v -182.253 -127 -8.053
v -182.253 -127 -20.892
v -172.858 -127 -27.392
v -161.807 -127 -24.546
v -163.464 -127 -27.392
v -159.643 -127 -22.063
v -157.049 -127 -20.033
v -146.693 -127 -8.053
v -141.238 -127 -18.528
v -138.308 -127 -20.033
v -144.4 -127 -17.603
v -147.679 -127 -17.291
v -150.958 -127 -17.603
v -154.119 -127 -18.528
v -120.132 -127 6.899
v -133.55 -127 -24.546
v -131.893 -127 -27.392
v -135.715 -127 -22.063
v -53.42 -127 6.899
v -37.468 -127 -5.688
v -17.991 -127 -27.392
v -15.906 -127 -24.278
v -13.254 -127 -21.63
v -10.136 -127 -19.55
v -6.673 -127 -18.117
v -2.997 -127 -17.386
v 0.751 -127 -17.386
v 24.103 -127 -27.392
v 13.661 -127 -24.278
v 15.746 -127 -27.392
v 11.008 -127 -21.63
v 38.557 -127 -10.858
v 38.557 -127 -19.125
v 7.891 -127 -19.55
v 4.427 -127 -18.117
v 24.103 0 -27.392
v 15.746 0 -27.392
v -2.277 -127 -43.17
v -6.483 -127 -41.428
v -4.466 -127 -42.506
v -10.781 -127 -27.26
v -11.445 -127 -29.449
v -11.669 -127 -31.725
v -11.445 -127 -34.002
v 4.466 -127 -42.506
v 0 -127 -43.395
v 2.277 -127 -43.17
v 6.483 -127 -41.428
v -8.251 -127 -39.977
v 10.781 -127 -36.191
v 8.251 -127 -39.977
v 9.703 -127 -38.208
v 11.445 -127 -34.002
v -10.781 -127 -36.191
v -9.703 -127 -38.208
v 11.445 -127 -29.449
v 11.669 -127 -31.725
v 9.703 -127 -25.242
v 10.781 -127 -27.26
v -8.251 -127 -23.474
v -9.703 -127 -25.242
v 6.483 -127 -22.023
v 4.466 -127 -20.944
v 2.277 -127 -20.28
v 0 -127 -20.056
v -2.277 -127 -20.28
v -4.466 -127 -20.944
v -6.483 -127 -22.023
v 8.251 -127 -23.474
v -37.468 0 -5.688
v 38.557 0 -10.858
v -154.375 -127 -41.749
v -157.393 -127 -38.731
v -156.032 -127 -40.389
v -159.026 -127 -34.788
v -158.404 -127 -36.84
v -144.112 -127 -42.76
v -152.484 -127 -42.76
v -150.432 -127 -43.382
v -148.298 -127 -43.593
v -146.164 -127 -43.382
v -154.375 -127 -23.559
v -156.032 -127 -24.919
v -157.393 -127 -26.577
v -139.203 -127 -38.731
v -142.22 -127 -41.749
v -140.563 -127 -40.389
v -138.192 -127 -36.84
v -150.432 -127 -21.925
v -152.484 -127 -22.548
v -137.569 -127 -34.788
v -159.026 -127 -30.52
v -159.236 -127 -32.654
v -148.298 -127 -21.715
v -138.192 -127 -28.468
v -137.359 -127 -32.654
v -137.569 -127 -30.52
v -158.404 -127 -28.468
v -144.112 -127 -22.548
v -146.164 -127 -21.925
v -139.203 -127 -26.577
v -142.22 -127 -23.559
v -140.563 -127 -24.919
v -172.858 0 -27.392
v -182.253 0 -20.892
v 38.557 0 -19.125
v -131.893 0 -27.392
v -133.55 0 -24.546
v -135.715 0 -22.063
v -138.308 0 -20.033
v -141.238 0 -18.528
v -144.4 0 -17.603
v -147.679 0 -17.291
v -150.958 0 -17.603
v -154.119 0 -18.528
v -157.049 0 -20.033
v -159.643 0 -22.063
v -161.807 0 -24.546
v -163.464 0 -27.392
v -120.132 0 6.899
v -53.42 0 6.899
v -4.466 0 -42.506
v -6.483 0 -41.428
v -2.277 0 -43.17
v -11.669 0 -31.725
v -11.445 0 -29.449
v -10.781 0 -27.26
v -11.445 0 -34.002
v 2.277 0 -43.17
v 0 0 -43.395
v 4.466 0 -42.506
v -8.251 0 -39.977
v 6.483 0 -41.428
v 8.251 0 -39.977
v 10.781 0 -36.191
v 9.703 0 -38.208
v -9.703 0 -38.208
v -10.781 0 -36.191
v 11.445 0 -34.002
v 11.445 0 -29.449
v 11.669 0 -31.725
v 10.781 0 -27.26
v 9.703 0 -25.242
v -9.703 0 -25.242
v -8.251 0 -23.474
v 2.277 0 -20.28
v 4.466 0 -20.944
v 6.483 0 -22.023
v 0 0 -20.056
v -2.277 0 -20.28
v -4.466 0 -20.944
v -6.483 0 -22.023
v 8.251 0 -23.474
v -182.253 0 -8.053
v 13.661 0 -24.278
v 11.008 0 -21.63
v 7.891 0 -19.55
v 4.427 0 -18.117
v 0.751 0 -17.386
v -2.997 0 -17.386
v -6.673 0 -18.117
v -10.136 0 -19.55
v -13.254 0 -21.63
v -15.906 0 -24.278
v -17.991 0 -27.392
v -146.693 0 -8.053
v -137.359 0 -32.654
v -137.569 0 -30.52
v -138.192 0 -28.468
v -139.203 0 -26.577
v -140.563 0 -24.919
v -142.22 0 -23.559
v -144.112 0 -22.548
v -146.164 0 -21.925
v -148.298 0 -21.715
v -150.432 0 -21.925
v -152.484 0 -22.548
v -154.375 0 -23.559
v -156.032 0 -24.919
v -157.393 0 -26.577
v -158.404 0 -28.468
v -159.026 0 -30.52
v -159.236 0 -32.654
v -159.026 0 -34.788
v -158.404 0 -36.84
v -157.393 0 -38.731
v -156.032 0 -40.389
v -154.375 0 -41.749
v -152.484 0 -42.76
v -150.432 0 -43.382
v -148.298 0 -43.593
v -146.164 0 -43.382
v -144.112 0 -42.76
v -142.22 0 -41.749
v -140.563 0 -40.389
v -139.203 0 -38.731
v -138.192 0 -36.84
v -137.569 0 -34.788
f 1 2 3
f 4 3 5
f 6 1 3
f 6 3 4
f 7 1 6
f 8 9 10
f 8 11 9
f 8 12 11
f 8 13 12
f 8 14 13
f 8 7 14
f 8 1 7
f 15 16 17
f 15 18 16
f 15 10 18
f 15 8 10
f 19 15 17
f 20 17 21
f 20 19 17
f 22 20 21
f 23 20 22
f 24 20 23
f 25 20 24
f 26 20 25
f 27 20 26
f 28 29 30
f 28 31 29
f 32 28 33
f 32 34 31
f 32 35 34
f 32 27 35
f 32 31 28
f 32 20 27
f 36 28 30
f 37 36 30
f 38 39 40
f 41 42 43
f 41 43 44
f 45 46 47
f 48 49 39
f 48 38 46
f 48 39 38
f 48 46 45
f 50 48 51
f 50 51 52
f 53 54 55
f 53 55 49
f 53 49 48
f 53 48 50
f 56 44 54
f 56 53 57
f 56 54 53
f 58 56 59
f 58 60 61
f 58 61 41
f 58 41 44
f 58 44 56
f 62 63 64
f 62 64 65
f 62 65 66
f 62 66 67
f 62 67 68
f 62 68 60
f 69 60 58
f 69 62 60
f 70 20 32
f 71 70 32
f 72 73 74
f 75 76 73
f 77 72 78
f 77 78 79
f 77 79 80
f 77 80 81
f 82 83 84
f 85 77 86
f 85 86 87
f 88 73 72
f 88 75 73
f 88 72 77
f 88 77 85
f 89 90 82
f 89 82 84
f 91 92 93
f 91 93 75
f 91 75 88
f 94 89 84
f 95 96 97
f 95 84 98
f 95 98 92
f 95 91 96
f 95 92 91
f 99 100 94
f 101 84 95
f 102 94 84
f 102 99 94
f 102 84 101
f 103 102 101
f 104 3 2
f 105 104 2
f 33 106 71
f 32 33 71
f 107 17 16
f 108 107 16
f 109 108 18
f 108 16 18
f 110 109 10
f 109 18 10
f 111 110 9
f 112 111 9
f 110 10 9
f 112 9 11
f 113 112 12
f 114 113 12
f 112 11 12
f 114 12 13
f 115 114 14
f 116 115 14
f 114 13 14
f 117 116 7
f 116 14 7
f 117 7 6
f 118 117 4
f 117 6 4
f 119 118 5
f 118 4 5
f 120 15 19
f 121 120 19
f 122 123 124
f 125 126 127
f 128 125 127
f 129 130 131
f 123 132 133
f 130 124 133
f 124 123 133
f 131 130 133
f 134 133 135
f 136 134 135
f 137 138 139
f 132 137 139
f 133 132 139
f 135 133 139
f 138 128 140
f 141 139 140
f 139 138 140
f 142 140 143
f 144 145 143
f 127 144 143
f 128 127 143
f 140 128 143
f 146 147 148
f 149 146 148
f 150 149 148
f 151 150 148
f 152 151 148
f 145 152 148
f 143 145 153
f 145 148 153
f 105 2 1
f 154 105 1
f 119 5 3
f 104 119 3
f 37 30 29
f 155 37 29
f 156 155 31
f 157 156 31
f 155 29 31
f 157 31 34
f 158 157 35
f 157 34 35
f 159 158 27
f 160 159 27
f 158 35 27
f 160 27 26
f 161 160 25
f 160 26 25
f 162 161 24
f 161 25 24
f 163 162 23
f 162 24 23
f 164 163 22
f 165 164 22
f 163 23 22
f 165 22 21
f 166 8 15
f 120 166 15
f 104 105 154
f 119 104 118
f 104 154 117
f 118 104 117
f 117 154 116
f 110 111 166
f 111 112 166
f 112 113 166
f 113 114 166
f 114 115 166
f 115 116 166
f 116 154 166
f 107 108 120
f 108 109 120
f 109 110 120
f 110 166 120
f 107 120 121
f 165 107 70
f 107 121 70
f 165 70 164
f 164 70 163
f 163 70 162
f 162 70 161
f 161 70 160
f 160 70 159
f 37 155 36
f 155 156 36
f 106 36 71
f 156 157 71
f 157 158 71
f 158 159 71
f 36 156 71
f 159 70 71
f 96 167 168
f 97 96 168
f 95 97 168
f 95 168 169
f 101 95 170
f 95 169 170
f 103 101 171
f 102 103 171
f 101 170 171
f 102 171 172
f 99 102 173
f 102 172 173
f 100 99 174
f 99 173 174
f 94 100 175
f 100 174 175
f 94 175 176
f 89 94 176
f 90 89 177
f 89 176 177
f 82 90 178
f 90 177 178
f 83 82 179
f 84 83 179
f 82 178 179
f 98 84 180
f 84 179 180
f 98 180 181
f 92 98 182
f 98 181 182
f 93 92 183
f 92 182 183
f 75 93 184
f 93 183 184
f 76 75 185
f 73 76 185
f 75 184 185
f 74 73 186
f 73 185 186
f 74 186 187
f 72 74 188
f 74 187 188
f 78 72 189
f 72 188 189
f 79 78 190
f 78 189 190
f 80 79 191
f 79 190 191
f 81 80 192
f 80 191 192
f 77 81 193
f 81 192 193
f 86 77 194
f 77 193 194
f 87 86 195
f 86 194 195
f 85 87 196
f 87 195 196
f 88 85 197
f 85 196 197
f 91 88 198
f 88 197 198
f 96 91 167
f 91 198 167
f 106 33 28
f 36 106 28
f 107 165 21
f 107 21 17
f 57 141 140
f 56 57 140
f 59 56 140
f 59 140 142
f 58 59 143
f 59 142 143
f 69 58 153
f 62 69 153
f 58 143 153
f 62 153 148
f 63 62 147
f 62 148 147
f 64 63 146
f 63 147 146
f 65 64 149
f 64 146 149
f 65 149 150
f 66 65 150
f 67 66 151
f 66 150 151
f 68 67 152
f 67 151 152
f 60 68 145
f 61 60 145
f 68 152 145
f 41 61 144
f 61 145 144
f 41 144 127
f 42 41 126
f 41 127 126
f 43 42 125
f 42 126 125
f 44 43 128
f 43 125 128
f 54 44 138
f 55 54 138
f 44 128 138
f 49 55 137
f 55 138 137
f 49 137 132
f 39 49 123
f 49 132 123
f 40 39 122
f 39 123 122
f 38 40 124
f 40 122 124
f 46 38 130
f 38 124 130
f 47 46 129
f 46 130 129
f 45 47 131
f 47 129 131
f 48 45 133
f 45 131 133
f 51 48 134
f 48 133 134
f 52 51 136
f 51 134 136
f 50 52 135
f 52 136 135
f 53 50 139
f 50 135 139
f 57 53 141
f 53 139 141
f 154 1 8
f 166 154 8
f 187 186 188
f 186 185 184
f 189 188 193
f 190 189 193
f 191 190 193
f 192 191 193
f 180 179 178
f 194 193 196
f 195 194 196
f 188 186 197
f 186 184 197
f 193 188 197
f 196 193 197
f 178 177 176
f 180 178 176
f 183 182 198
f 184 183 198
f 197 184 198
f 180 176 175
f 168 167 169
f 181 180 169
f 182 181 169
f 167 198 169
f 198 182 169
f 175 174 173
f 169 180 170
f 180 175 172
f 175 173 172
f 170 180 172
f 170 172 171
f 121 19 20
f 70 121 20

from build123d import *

# Parameters (mm, degrees)
F0_W     = 254
F0_H     = 63.5
F1_DEPTH = 127
F3_DEPTH = 127
F5_DEPTH = 127
F7_DEPTH = 127
F8_R     = 10.938676
F8_R_2   = 11.669206
F9_DEPTH = 127


with BuildPart() as f1:
    # F0 (on Front) → F1 (new body)
    with BuildSketch(Plane.XZ):
        with Locations((-88.44309, -10.857639)):
            Rectangle(F0_W, F0_H)
    extrude(amount=F1_DEPTH)

    # F2 (on face) → F3 (cut)
    with BuildSketch(Plane.XZ.offset(127)):
        Polygon((-37.467527, -5.688028), (38.55691, -10.857639), (38.55691, 20.892361), (-215.44309, 20.892361), (-215.44309, -42.607639), (38.55691, -42.607639), (38.55691, -27.392207), (-182.252563, -27.392207), (-182.252563, -8.052954), (-146.692563, -8.052954), (-120.131686, 6.898642), (-53.419898, 6.898642), align=None)
    extrude(amount=-F3_DEPTH, mode=Mode.SUBTRACT)

    # F4 (on face) → F5 (cut)
    with BuildSketch(Plane.XZ.offset(127)):
        with BuildLine():
            Line((-163.463995, -27.392207), (-131.893307, -27.392207))
            ThreePointArc((-131.893307, -27.392207), (-147.678651, -17.29131), (-163.463995, -27.392207))
        make_face()
        with BuildLine():
            ThreePointArc((15.746029, -27.392207), (-1.122616, -17.294191), (-17.991262, -27.392207))
            Line((-17.991262, -27.392207), (15.746029, -27.392207))
        make_face()
    extrude(amount=-F5_DEPTH, mode=Mode.SUBTRACT)

    # F6 (on face) → F7 (cut)
    with BuildSketch(Plane.XZ.offset(127)):
        Polygon((-182.252563, -27.392207), (-172.858279, -27.392207), (-182.252563, -20.892361), align=None)
        Polygon((38.55691, -19.124923), (24.102971, -27.392207), (38.55691, -27.392207), align=None)
    extrude(amount=-F7_DEPTH, mode=Mode.SUBTRACT)


with BuildPart() as f9:
    # F8 (on Front) → F9 (new body)
    with BuildSketch(Plane.XZ):
        with Locations((-148.297682, -32.653984)):
            Circle(F8_R)
        with Locations((0, -31.725436)):
            Circle(F8_R_2)
    extrude(amount=F9_DEPTH)


solid = Compound([f1.part, f9.part])
